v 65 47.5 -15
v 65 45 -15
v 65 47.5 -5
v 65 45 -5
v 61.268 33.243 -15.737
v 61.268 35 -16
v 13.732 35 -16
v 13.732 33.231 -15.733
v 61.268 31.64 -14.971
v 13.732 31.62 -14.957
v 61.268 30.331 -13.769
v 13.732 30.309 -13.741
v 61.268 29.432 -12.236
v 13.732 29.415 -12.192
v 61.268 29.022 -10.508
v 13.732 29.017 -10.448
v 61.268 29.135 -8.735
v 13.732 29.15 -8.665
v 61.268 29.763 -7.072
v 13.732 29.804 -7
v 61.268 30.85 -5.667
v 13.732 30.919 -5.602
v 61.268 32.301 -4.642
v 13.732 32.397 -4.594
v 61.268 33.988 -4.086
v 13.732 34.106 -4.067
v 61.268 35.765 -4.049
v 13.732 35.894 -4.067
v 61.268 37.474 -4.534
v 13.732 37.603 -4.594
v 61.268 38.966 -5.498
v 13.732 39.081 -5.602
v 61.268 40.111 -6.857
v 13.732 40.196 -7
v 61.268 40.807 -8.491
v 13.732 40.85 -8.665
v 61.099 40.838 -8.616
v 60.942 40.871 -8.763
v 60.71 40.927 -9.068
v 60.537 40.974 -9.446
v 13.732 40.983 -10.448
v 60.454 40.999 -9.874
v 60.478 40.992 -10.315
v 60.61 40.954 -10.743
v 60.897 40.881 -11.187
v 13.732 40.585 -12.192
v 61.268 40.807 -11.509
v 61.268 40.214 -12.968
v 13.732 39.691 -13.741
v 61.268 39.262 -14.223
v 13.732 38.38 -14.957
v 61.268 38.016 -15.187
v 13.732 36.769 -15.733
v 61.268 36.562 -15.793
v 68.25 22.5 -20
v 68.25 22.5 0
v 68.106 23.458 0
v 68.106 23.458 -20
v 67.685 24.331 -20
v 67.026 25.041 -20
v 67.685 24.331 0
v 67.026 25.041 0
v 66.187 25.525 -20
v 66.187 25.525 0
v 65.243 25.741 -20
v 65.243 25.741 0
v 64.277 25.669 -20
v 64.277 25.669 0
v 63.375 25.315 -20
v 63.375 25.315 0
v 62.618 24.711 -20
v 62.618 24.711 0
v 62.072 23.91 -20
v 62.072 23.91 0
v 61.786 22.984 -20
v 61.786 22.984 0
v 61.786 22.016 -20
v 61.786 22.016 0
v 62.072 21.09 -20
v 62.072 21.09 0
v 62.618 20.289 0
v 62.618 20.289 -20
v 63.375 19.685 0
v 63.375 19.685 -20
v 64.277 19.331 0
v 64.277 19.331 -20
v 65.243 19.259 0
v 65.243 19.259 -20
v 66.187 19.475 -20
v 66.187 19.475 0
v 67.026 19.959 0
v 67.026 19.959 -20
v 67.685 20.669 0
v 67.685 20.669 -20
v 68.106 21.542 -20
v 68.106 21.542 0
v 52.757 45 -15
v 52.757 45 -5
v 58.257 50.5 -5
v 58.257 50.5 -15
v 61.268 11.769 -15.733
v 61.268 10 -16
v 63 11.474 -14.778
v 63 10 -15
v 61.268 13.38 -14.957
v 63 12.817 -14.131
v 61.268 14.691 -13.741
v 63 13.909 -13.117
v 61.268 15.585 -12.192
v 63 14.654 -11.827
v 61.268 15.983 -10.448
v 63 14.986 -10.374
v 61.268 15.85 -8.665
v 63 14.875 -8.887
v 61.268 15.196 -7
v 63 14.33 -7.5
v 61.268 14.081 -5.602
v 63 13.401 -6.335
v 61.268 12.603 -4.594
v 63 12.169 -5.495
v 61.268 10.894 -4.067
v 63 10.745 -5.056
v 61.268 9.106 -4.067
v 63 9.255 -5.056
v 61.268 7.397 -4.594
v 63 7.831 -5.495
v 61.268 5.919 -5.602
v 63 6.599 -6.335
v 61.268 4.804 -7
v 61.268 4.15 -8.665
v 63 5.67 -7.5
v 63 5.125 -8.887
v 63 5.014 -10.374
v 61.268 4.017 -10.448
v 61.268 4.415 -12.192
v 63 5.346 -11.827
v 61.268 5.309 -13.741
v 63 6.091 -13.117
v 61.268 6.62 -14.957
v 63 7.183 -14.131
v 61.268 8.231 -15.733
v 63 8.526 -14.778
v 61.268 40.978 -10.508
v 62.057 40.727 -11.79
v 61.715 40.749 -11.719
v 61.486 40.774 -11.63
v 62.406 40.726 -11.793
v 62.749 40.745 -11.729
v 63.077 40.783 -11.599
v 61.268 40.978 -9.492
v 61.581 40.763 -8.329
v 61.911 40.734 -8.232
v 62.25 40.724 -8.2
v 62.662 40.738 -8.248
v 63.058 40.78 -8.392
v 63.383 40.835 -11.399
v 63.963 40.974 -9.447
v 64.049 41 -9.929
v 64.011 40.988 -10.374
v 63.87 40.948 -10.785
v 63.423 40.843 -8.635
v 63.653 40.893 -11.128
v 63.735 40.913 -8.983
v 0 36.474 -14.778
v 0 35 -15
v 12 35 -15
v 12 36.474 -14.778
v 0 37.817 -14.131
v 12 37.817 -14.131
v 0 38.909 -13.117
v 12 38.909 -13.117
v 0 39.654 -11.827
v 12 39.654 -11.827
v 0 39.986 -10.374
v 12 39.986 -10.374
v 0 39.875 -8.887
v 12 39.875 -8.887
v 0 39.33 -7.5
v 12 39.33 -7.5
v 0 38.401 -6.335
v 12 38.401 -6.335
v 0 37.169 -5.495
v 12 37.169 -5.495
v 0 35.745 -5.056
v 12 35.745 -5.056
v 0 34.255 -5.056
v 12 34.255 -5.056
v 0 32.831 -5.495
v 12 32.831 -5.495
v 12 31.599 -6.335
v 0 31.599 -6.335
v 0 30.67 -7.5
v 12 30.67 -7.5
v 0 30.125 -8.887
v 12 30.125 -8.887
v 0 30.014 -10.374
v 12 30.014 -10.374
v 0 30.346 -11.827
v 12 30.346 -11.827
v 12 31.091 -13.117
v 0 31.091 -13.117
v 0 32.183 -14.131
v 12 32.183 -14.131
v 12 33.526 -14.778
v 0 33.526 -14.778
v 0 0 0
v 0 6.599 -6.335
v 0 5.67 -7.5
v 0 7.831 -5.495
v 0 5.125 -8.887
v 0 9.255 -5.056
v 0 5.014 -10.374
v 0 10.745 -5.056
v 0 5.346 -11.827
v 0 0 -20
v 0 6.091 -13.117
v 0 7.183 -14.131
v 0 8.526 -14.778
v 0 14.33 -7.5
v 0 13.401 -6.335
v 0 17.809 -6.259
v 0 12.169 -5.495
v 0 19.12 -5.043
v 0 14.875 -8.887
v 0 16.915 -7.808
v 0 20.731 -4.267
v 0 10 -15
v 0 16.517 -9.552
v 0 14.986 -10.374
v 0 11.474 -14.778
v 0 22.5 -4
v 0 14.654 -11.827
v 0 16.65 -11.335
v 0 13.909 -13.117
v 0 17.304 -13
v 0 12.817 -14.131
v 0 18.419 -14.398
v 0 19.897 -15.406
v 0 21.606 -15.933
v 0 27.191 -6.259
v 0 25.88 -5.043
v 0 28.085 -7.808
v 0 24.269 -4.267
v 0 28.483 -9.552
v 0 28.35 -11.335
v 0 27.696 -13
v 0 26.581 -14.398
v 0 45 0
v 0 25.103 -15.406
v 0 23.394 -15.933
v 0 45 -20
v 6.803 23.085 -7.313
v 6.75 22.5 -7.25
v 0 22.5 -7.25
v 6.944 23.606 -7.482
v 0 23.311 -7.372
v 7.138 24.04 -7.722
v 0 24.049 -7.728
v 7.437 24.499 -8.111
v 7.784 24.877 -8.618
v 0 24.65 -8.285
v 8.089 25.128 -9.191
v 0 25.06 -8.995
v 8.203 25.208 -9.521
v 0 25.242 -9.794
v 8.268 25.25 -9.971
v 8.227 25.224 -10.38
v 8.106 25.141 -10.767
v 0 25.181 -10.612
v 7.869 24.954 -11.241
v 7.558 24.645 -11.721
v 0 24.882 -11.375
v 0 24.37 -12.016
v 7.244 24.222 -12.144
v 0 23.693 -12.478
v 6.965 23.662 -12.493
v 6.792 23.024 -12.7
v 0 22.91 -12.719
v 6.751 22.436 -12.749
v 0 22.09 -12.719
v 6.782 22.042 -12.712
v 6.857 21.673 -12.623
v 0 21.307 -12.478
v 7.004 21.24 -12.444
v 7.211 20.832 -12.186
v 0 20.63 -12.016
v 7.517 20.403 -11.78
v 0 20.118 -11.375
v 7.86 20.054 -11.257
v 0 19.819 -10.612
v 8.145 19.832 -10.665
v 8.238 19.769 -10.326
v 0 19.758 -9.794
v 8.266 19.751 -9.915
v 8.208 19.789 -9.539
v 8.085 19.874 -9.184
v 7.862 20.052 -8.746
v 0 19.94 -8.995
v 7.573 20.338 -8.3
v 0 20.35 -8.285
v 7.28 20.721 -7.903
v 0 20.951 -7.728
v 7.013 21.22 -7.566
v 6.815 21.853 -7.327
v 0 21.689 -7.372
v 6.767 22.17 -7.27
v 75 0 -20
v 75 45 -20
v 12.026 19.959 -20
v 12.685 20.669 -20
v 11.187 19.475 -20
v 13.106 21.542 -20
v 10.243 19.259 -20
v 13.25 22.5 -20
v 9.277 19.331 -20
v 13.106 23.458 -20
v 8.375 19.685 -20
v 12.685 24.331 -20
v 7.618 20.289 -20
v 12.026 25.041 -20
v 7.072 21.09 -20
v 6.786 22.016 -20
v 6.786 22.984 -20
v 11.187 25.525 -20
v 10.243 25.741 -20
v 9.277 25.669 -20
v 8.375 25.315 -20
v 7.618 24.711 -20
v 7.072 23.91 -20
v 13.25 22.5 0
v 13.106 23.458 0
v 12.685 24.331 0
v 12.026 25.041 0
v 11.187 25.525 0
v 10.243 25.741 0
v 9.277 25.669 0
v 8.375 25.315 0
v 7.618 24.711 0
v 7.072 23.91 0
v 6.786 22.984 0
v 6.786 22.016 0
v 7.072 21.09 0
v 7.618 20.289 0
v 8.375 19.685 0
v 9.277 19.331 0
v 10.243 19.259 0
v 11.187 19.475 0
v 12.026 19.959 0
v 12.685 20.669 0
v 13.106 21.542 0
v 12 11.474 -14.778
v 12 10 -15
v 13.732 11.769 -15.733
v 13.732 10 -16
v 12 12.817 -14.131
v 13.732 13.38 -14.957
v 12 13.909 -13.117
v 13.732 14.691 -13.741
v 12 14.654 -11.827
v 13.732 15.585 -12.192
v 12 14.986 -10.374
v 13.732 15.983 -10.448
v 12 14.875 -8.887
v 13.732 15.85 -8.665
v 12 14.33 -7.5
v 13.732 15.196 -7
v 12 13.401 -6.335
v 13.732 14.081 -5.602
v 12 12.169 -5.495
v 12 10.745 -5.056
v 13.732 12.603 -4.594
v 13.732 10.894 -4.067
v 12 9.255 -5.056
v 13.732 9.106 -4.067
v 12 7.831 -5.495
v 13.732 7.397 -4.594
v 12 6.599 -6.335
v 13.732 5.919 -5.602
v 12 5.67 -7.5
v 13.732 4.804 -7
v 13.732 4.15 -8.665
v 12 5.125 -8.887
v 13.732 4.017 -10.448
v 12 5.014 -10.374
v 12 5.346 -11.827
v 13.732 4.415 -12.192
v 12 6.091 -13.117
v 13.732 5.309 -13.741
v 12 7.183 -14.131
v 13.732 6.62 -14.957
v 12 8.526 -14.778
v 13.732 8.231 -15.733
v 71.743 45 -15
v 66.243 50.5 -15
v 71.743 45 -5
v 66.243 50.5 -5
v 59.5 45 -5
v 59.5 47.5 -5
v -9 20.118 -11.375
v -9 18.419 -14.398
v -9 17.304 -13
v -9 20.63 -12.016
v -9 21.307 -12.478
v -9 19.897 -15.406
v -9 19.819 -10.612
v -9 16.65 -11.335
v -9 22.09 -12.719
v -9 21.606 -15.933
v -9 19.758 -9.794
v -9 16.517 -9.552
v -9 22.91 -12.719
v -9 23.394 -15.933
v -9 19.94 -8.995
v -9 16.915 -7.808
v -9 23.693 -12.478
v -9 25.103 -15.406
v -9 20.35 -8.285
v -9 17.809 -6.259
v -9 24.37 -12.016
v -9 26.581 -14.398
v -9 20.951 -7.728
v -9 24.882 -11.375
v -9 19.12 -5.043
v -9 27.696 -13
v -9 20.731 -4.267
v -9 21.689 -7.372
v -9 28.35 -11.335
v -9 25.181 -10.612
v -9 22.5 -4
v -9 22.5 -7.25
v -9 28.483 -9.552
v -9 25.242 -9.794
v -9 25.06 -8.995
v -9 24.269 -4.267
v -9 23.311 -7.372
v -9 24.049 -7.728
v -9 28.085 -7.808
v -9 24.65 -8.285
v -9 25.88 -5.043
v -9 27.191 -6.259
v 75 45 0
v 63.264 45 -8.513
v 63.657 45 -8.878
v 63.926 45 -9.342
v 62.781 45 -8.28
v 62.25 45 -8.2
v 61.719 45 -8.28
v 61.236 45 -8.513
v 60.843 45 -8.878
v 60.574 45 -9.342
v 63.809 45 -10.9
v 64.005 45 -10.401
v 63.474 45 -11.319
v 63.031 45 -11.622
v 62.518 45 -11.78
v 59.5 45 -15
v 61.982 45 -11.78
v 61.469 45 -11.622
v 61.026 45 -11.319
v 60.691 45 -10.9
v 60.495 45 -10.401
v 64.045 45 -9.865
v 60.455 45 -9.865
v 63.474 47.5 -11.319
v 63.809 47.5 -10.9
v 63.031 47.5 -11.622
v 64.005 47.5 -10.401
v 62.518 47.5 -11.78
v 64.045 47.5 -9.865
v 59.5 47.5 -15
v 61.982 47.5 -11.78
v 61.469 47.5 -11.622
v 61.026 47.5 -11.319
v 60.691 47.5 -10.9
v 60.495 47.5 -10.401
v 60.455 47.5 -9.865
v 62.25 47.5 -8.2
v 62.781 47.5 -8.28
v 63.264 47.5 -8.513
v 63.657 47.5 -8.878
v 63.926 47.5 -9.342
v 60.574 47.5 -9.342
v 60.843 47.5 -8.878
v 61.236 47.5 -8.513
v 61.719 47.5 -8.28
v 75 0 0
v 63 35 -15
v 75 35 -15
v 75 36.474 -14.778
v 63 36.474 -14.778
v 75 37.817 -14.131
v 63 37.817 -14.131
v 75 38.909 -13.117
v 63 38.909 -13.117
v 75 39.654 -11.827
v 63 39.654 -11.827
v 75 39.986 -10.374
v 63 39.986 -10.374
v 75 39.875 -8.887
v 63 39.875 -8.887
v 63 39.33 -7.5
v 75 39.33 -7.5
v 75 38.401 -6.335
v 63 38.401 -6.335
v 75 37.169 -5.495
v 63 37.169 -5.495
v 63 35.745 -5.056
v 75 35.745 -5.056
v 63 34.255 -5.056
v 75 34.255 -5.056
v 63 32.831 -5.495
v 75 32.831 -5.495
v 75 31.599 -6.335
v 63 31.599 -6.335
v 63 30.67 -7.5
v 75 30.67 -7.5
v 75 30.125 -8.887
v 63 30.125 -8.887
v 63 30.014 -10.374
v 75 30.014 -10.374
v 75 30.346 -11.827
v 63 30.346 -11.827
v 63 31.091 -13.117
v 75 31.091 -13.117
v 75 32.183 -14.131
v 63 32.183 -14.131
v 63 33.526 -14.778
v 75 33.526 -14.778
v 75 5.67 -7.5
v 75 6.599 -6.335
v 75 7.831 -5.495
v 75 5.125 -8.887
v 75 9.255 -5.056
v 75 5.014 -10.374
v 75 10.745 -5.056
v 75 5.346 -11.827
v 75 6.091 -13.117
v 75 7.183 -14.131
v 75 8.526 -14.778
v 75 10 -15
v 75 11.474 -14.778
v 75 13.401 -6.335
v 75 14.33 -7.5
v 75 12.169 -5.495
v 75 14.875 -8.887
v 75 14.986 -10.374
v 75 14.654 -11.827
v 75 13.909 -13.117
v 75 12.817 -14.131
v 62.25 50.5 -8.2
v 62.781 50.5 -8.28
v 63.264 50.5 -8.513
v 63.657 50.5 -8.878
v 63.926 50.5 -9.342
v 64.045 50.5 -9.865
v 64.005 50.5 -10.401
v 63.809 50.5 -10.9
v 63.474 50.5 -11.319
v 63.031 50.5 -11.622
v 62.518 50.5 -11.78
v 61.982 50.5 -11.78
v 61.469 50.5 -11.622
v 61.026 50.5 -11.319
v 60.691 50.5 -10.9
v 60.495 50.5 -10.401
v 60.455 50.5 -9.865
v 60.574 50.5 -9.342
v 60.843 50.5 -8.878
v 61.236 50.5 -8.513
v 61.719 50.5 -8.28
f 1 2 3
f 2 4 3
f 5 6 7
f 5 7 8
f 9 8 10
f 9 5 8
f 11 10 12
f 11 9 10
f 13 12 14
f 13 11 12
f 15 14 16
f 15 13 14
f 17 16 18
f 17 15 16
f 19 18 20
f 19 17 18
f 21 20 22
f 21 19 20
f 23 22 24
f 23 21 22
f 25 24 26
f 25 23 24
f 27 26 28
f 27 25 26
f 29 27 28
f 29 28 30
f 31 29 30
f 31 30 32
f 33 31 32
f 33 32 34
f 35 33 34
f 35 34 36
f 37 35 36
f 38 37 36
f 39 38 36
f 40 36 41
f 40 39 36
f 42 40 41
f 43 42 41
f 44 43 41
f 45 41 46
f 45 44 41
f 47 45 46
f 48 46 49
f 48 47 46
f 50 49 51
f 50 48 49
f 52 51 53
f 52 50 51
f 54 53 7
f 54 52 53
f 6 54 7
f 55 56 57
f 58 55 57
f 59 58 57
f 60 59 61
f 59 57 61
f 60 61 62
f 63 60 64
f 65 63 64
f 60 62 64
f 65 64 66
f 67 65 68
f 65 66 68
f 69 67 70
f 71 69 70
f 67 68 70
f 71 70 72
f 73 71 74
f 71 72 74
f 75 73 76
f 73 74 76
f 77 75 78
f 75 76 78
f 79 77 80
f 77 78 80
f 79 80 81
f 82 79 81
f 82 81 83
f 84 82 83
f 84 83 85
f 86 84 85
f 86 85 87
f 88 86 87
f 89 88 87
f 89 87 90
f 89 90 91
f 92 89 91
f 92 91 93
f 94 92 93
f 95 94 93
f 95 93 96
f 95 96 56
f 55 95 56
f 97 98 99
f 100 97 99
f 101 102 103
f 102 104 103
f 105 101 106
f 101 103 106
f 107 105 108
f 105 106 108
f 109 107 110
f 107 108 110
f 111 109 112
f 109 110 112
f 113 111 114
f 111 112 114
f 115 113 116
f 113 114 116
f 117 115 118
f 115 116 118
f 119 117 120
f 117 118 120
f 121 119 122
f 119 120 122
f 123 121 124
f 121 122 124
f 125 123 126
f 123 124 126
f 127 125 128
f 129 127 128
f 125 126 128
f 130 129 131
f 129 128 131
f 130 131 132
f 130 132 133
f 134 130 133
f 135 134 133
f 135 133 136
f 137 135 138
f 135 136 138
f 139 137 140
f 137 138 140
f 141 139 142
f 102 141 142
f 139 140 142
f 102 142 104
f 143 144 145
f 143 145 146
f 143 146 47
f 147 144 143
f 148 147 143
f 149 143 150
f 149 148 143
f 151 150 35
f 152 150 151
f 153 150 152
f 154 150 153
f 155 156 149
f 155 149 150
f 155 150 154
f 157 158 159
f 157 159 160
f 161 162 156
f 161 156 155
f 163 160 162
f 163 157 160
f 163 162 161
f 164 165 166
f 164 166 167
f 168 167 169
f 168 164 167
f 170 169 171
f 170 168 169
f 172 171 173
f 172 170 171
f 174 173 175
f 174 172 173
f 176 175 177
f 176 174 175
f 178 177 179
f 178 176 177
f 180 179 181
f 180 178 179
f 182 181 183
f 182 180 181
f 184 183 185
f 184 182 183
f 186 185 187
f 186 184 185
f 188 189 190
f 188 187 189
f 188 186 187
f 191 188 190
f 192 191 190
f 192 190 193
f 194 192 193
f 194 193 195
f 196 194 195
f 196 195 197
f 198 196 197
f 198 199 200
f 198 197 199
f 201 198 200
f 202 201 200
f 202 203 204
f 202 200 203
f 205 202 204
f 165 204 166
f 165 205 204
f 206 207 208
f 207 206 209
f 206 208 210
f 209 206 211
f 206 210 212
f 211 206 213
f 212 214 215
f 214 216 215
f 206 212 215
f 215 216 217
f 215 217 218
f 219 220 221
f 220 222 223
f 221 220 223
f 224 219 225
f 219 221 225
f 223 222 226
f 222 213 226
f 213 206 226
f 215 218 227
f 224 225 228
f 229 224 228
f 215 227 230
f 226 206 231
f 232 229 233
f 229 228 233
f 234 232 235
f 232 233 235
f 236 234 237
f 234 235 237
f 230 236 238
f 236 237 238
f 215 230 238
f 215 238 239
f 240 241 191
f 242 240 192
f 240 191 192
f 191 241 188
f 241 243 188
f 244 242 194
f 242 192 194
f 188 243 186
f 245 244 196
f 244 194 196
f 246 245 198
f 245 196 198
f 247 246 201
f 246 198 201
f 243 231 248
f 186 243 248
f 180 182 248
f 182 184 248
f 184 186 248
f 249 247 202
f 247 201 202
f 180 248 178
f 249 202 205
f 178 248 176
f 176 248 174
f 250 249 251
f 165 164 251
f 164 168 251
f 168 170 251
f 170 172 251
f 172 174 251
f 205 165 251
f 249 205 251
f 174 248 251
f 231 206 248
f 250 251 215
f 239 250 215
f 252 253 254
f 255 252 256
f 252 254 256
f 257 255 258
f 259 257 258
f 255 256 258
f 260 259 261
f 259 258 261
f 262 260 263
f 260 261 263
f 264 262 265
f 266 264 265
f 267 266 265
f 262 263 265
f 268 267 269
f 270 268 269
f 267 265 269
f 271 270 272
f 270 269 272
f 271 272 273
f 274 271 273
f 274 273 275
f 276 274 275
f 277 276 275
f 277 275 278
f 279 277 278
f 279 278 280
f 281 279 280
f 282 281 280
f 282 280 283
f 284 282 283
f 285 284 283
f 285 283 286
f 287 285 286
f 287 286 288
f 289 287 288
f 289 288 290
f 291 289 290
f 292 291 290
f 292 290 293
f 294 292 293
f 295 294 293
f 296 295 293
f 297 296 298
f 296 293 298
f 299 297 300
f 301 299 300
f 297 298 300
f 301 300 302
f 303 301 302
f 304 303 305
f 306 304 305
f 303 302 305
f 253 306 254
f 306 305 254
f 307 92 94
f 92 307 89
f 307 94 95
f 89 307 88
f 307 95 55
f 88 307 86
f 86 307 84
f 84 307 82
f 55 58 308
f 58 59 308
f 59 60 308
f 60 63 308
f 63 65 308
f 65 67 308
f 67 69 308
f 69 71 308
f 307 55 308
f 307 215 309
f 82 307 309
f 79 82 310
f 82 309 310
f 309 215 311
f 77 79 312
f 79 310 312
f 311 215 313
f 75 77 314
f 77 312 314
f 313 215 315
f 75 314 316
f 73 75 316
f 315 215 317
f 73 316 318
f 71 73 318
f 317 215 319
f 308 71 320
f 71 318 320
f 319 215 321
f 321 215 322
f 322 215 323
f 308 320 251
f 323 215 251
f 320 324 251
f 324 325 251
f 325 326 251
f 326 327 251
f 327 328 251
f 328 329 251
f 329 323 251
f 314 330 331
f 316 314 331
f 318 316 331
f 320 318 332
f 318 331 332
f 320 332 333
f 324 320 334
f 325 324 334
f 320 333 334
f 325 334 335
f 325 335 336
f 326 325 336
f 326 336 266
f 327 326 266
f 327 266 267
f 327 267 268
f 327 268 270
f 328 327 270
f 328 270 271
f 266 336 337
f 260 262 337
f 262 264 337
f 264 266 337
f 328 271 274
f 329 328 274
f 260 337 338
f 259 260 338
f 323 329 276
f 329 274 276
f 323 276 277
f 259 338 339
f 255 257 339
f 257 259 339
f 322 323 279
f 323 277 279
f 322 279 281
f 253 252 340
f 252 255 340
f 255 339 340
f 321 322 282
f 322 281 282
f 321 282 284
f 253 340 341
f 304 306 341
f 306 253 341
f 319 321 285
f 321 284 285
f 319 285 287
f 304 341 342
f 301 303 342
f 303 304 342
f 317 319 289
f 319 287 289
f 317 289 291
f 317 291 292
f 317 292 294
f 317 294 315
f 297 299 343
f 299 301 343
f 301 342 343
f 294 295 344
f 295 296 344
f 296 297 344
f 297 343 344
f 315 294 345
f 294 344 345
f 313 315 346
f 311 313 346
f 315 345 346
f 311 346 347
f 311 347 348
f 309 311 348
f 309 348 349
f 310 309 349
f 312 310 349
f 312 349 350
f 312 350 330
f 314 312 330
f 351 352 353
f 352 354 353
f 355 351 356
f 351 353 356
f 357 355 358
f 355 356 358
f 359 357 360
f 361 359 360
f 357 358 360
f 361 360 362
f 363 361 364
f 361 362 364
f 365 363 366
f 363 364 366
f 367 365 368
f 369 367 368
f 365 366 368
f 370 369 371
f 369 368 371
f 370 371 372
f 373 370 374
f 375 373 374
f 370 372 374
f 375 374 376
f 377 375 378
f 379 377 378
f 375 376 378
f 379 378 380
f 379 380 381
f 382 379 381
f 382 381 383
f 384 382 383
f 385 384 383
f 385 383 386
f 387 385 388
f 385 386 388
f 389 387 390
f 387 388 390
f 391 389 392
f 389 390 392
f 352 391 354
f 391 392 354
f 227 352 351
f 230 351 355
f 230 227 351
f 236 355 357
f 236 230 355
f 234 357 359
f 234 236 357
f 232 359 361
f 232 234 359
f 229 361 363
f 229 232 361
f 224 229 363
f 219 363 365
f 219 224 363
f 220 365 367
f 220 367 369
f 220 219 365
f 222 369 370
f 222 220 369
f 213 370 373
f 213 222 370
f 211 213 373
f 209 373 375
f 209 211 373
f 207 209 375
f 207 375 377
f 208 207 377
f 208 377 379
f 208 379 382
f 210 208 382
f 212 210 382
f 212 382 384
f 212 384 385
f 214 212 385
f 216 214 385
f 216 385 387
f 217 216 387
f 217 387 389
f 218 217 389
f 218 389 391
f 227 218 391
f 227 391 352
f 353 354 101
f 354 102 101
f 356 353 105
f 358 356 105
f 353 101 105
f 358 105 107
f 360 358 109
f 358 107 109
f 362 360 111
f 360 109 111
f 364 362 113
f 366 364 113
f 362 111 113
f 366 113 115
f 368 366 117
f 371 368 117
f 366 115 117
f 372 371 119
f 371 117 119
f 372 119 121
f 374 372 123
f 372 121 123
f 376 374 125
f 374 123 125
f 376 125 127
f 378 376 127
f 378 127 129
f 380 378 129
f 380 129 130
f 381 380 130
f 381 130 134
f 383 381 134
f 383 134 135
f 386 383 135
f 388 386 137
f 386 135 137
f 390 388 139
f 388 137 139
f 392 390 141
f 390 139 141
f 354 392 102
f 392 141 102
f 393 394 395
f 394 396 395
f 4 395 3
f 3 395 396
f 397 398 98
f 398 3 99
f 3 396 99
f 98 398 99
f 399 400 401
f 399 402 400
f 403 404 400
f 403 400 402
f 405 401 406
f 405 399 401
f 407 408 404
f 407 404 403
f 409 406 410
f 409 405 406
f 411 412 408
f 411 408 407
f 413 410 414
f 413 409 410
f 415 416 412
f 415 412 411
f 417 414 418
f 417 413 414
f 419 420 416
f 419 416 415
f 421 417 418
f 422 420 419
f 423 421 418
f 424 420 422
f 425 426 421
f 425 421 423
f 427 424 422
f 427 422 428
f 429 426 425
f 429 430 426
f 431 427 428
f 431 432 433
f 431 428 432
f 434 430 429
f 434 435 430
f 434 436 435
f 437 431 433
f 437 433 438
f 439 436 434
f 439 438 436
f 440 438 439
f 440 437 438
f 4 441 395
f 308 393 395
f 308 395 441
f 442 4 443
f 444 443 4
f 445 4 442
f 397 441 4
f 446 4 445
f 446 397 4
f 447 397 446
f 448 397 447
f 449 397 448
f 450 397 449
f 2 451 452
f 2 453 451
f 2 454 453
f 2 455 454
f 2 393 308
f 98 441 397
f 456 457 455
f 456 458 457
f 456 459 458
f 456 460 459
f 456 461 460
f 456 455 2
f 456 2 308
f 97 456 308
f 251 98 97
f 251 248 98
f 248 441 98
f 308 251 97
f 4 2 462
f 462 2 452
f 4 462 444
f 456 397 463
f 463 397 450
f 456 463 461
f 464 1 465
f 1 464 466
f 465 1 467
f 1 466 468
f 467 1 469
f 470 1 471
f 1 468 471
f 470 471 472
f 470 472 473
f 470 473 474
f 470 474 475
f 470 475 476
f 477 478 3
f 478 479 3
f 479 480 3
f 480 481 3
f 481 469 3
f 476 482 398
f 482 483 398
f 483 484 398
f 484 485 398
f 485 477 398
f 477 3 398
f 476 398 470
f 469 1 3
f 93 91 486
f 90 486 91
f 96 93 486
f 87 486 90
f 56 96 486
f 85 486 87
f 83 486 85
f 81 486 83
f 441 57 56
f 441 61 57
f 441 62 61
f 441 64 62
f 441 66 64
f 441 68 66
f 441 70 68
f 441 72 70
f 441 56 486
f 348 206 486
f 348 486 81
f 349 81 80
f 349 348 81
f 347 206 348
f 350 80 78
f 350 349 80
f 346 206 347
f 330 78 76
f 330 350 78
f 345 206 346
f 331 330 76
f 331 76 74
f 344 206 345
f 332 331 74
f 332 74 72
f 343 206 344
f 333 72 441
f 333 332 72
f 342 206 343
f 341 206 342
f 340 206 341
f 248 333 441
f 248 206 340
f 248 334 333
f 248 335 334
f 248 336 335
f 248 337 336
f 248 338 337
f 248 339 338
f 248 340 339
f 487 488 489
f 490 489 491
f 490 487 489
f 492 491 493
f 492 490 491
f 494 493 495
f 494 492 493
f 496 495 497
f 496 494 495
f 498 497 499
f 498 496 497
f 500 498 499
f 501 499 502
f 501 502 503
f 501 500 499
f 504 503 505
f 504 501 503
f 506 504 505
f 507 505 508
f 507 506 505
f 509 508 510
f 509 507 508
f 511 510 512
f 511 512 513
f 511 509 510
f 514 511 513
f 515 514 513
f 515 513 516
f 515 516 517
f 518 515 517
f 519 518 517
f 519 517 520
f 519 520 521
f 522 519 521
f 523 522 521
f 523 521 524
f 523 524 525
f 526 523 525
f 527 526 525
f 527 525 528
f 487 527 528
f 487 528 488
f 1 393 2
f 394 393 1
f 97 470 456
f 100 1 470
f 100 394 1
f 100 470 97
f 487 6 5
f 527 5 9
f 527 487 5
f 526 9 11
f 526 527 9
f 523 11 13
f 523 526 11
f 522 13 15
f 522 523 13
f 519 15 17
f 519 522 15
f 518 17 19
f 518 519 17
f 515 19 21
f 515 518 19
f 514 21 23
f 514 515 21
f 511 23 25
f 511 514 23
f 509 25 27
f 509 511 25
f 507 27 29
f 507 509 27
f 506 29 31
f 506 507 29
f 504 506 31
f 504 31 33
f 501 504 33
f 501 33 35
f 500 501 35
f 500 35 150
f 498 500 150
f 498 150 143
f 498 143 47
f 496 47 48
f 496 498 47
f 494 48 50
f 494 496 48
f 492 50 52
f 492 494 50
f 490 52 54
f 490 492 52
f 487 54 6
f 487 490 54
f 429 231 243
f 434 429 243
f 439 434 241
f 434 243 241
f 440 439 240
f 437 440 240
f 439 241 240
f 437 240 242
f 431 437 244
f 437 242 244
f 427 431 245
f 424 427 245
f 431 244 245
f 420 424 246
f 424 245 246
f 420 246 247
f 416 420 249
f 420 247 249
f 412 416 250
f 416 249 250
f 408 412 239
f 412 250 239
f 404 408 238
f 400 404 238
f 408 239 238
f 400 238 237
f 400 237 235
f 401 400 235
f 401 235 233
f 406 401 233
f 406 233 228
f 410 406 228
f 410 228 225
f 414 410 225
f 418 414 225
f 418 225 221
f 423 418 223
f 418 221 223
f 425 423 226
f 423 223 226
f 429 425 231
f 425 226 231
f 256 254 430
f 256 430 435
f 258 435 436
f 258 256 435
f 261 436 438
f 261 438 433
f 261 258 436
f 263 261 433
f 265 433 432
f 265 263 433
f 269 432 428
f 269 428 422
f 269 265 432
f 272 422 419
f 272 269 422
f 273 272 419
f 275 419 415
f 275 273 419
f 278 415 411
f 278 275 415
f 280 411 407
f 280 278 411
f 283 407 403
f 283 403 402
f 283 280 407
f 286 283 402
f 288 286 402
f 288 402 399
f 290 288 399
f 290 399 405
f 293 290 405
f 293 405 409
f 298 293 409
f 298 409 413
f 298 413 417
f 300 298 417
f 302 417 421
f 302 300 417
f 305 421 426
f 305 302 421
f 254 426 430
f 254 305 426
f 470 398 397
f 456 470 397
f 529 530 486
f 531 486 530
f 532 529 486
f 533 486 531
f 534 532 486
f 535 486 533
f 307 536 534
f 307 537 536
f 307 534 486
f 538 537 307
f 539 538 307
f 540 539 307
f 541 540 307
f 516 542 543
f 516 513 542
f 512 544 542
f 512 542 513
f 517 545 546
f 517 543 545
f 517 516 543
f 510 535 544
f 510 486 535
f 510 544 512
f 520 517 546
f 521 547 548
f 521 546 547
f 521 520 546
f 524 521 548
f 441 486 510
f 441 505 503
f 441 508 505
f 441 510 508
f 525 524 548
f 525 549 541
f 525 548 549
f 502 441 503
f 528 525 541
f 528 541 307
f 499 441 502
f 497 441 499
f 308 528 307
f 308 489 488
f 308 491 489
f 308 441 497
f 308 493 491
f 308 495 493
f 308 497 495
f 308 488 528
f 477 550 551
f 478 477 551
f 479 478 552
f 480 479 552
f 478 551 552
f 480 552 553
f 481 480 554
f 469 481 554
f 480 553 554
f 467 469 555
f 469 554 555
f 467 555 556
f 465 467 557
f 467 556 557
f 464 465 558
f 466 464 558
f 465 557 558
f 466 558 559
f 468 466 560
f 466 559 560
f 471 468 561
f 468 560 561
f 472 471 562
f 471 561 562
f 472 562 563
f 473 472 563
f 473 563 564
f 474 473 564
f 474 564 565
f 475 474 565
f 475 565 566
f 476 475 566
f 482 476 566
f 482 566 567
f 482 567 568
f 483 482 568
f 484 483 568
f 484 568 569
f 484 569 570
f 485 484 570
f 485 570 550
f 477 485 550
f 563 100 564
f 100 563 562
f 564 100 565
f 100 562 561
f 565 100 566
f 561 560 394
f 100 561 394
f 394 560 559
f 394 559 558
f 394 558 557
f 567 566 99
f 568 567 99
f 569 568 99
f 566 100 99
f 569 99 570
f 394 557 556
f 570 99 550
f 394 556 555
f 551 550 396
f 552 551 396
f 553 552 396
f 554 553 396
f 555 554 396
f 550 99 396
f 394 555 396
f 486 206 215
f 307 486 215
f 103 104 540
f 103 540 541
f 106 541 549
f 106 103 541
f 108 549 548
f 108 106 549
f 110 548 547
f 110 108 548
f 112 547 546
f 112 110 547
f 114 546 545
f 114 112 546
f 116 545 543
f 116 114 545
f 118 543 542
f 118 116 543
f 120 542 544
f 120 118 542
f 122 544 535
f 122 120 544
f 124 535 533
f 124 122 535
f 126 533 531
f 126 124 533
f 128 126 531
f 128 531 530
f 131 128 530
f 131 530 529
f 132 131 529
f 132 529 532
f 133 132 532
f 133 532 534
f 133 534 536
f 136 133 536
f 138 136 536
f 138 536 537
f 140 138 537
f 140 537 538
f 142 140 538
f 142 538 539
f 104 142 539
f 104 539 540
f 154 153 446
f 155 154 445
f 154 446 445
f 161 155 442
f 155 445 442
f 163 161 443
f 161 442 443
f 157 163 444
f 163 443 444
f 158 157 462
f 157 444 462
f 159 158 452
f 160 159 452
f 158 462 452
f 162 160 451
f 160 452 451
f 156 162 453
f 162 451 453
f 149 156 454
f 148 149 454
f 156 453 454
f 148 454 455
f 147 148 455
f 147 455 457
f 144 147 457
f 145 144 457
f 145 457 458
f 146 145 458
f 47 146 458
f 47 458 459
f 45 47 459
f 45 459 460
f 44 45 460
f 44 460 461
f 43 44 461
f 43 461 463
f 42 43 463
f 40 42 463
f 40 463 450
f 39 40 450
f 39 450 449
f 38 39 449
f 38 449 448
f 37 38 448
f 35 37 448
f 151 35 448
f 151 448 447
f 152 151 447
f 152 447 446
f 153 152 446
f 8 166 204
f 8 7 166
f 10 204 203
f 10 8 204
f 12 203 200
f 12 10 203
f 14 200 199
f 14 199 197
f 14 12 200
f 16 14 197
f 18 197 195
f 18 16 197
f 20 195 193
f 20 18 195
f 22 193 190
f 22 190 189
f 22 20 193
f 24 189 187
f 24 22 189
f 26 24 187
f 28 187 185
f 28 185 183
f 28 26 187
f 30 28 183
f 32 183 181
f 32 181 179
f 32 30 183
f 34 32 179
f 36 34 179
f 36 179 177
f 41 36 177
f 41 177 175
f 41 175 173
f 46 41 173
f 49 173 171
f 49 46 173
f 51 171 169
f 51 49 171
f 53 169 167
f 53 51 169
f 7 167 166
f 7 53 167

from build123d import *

# Parameters (mm, degrees)
SKETCH1_W               = 20
SKETCH1_H               = 45
SKETCH1_R               = 5
BOSS_EXTRUDE1_DEPTH     = 75
SKETCH2_R               = 3.25
CUT_EXTRUDE1_DEPTH      = 90.721792225
SKETCH5_R               = 6
SKETCH5_R_2             = 2.75
BOSS_EXTRUDE3_DEPTH     = 9
CUT_EXTRUDE2_REACH      = 91.722
SKETCH6_R               = 2.75
BOSS_EXTRUDE4_DEPTH     = 5
CUT_EXTRUDE3_REACH      = 94.603
CUT_EXTRUDE3_END_RADIUS = 6
SKETCH9_R               = 1.8


with BuildPart() as part:
    # Sketch1 → Boss-Extrude1 (new body)
    with BuildSketch(Plane(origin=(0, 0, 0), x_dir=(0, 0, -1), z_dir=(1, 0, 0))):
        with Locations((10, 22.5)):
            Rectangle(SKETCH1_W, SKETCH1_H)
        with Locations((10, 35)):
            Circle(SKETCH1_R, mode=Mode.SUBTRACT)
        with Locations((10, 10)):
            Circle(SKETCH1_R, mode=Mode.SUBTRACT)
    extrude(amount=BOSS_EXTRUDE1_DEPTH)

    # Sketch2 → Cut-Extrude1 (cut, through all)
    with BuildSketch(Plane.XY):
        with Locations((10, 22.5)):
            Circle(SKETCH2_R)
        with Locations((65, 22.5)):
            Circle(SKETCH2_R)
    extrude(amount=-CUT_EXTRUDE1_DEPTH, mode=Mode.SUBTRACT)

    # Sketch4 → Cut-Revolve1 (revolve, cut)
    with BuildSketch(Plane.XY.offset(-10), mode=Mode.PRIVATE) as cut_revolve1_sk:
        Polygon((12, 40), (13.732050808, 41), (61.267949192, 41), (63, 40), align=None)
    cut_revolve1 = revolve(cut_revolve1_sk.sketch.rotate(Axis((75, 35, -10), (-1, 0, 0)), 90), axis=Axis((75, 35, -10), (-1, 0, 0)), mode=Mode.SUBTRACT)

    # Mirror1: Cut-Revolve1 across plane
    add(cut_revolve1.mirror(Plane.ZX.offset(22.5)), mode=Mode.SUBTRACT)

    # Sketch5 → Boss-Extrude3 (add)
    with BuildSketch(Plane.ZY):
        with Locations((-10, 22.5)):
            Circle(SKETCH5_R)
        with Locations((-10, 22.5)):
            Circle(SKETCH5_R_2, mode=Mode.SUBTRACT)
    extrude(amount=BOSS_EXTRUDE3_DEPTH)

    # Sketch6 → Cut-Extrude2 (cut, up to next)
    with BuildSketch(Plane.ZY, mode=Mode.PRIVATE) as cut_extrude2_sk1:
        with Locations((-10, 22.5)):
            Circle(SKETCH6_R)
    cut_extrude2_tool1 = extrude(cut_extrude2_sk1.sketch, amount=-CUT_EXTRUDE2_REACH, mode=Mode.PRIVATE) & part.part
    add(cut_extrude2_tool1.solids().sort_by_distance((0, 22.5, -10))[0], mode=Mode.SUBTRACT)

    # Sketch8 → Boss-Extrude4 (add, symmetric)
    with BuildSketch(Plane.XY.offset(-10)):
        Polygon((52.757359313, 45), (58.257359313, 50.5), (66.242640687, 50.5), (71.742640687, 45), (65, 45), (65, 47.5), (59.5, 47.5), (59.5, 45), align=None)
    extrude(amount=BOSS_EXTRUDE4_DEPTH, both=True)

    # Cut-Extrude3: up to this cylinder (the profile starts outside it)
    cut_extrude3_end = Plane(origin=(62.25, 35, -10), z_dir=(1, 0, 0)) * Cylinder(CUT_EXTRUDE3_END_RADIUS, 202.206, mode=Mode.PRIVATE)
    # Sketch9 → Cut-Extrude3 (cut, up to the surface)
    with BuildSketch(Plane(origin=(0, 50.5, 0), x_dir=(1, 0, 0), z_dir=(0, 1, 0)), mode=Mode.PRIVATE) as cut_extrude3_sk1:
        with Locations(Location((62.25, 10, 0), (0, 0, 270))):
            Circle(SKETCH9_R)
    cut_extrude3_tool1 = extrude(cut_extrude3_sk1.sketch, amount=-CUT_EXTRUDE3_REACH, mode=Mode.PRIVATE) - cut_extrude3_end
    add(cut_extrude3_tool1.solids().sort_by_distance((62.25, 50.5, -10))[0], mode=Mode.SUBTRACT)


solid = part.part
